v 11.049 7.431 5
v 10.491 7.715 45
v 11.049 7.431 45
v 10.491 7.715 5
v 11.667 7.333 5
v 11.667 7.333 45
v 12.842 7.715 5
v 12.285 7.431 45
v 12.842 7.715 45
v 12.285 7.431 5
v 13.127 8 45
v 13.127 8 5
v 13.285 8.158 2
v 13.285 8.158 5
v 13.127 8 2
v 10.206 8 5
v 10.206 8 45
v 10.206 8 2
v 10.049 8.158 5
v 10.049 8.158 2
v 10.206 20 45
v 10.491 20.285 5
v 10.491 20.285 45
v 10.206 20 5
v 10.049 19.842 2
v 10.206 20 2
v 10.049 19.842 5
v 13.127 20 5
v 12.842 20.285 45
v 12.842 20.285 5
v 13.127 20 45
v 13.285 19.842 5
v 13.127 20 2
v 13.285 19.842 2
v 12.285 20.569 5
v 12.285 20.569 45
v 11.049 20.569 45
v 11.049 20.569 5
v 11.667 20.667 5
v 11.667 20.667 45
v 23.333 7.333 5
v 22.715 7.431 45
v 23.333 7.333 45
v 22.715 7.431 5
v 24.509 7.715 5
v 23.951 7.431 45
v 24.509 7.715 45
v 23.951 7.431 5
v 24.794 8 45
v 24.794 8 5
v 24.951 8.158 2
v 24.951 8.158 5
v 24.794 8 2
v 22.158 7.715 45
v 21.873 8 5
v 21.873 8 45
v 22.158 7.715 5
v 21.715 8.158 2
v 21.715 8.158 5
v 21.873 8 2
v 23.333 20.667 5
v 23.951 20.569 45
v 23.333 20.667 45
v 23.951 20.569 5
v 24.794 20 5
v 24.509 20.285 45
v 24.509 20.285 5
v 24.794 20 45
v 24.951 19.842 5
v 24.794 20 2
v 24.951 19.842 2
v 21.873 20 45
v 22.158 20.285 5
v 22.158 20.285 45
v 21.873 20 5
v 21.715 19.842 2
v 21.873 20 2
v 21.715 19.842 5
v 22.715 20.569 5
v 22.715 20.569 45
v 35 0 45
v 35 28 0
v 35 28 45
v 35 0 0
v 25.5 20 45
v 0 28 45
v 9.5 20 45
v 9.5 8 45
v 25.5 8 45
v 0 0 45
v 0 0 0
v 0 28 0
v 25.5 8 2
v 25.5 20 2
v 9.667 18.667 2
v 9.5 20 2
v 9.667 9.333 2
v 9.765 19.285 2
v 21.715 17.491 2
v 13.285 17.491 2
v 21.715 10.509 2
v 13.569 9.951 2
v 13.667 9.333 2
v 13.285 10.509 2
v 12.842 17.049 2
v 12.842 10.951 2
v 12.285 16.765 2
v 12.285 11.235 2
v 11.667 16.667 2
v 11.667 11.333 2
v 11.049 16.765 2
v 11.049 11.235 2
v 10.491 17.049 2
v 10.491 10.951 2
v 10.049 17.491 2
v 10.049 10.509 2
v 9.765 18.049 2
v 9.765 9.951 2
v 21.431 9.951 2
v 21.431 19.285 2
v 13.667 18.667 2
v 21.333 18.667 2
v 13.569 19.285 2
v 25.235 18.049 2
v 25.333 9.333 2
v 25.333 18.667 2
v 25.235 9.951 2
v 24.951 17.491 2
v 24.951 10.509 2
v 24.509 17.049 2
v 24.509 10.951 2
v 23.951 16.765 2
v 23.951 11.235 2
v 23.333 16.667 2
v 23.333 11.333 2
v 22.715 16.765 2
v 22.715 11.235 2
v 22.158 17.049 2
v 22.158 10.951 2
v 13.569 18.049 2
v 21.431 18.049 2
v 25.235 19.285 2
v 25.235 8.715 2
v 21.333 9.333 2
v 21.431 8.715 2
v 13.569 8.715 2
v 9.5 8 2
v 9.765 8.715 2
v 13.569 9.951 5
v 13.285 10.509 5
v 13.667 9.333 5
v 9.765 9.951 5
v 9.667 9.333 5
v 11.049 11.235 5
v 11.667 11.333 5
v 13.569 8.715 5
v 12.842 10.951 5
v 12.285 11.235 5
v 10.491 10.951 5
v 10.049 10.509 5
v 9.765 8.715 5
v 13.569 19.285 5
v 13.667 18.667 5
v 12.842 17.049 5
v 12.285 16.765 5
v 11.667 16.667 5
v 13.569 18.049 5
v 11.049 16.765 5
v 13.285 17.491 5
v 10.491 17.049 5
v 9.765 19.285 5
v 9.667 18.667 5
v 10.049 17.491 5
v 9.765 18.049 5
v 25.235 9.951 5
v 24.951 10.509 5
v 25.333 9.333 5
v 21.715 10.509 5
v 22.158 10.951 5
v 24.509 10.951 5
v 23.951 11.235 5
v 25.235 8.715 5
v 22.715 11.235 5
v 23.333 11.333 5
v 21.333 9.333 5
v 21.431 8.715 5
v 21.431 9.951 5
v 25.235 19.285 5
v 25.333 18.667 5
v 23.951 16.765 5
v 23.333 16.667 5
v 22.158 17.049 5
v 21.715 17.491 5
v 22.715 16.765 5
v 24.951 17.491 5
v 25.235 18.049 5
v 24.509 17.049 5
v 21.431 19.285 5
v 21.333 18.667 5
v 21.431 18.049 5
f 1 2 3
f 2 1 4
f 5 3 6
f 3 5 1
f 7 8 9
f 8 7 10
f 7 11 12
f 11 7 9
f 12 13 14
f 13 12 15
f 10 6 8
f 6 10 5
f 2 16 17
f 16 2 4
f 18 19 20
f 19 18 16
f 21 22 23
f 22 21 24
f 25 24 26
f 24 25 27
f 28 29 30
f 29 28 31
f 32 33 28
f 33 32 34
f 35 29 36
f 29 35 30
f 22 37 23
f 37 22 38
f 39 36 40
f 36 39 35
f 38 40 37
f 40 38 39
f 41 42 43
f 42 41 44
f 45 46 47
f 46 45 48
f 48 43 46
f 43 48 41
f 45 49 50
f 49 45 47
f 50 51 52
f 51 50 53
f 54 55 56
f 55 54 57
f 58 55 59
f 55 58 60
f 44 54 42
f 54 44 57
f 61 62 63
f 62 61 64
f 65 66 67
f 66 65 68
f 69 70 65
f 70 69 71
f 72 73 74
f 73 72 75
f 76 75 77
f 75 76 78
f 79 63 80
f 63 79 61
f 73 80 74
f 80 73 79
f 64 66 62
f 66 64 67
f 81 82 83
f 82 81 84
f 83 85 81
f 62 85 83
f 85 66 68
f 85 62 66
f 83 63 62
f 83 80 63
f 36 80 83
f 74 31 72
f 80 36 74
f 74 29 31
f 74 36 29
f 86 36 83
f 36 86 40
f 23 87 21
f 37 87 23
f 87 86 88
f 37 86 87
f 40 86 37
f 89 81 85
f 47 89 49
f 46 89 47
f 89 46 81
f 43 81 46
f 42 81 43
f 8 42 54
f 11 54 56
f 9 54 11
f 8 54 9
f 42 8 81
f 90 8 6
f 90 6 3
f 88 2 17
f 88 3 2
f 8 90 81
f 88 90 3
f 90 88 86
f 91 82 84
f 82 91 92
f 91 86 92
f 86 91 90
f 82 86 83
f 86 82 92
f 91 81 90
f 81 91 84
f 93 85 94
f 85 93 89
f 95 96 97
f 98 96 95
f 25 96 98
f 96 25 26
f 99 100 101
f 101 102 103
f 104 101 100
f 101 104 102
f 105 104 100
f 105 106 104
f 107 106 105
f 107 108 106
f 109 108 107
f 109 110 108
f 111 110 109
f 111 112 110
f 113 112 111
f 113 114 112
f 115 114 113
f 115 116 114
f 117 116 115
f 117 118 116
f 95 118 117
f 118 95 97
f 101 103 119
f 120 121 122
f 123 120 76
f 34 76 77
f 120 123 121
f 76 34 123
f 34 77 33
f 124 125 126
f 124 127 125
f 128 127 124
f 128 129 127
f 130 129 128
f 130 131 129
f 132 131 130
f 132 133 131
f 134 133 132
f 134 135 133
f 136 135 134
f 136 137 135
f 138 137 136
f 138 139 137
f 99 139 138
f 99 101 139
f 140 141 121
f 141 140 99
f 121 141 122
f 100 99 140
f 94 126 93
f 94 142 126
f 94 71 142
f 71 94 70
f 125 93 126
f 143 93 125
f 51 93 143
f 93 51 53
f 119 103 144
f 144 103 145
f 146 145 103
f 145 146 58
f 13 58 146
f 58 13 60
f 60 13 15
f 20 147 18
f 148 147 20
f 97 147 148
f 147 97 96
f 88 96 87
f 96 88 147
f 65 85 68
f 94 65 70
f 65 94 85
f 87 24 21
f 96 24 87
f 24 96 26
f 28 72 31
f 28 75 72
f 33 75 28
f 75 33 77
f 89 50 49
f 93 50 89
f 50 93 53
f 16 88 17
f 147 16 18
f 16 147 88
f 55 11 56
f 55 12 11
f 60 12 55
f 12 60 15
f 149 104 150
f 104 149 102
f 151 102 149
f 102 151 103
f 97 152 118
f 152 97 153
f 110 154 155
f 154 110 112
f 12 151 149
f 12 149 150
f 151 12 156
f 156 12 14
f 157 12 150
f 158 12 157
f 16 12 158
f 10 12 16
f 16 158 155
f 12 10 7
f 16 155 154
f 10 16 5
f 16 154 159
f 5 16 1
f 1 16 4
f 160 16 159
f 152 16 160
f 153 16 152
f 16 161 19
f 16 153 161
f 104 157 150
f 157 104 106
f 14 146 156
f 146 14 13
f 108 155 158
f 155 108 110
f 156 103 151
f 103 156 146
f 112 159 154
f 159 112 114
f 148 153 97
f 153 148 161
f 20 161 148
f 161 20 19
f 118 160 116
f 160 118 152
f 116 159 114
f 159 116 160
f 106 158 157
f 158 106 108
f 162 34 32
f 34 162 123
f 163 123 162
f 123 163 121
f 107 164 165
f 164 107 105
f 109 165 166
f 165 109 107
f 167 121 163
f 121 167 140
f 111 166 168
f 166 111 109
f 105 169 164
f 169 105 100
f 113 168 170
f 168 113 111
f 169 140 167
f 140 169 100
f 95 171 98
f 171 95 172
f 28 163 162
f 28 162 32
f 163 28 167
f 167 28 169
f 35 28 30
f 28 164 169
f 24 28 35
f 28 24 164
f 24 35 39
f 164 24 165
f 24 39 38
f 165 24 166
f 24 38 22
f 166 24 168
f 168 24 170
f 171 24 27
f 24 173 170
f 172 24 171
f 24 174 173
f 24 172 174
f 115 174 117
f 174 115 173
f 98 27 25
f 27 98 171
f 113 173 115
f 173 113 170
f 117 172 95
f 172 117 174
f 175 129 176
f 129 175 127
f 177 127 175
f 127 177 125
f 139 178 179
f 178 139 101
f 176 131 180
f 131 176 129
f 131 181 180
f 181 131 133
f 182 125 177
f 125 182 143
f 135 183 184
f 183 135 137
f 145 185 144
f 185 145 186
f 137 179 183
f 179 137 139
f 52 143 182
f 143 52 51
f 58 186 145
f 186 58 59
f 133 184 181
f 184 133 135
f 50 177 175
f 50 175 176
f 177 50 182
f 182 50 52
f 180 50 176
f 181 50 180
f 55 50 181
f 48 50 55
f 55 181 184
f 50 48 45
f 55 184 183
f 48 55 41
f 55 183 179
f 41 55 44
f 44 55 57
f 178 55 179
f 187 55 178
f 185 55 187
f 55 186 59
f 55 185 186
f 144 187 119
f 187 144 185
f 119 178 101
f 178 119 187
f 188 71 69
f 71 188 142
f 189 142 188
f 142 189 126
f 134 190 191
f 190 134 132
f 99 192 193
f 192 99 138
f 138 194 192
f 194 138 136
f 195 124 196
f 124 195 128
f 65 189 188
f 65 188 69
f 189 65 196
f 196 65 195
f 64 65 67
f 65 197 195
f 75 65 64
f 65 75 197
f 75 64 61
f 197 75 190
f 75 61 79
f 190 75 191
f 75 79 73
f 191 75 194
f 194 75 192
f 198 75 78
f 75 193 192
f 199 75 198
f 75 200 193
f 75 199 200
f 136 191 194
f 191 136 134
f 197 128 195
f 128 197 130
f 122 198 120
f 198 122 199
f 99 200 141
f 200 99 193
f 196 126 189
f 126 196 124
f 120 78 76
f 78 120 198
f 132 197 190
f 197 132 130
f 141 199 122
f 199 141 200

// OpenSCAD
/* 
 * Ratchet Holder Generator
 * Holds ratchets in various drive sizes
 * Compatible with toolgrid-generator.scad peg hole pattern
 */

/* [Display Mode] */
print_mode = "single"; // [single, multi_row]

/* [Grid Integration] */
hole_center_spacing = 9.5; // [8:12]
pin_hole_diameter = 4.2; // [3:8]

/* [Drive Size] */
drive_size = "1-4"; // [1-4, 3-8]

/* [Housing Dimensions] */
housing_width = 35; // [25:50]
housing_height = 28; // [18:40]
housing_depth = 45; // [30:70]

/* [Pin Configuration] */
pin_diameter = 4.0; // [3:6]
num_pins_x = 2; // [1:4]
num_pins_y = 2; // [1:4]

/* [Rotation] */
holder_rotation = 0; // [0:360]

/* [Wall Thickness] */
wall_thickness = 3; // [2:5]
floor_thickness = 2; // [1:4]

/* [Advanced] */
pin_offset_from_edge = 3; // [1:8]
fillet_radius = 1; // [0:3]

// ===== CALCULATED PARAMETERS =====
pin_spacing_x = housing_width / (num_pins_x + 1);
pin_spacing_y = housing_height / (num_pins_y + 1);

// ===== MAIN MODULES =====

module holder_base() {
    difference() {
        cube([housing_width, housing_height, housing_depth]);
        
        // Central cavity for ratchet head
        translate([
            (housing_width - 16) / 2,
            (housing_height - 12) / 2,
            floor_thickness
        ]) {
            cube([16, 12, housing_depth]);
        }
        
        for (x = [1:num_pins_x]) {
            for (y = [1:num_pins_y]) {
                pin_x = x * pin_spacing_x;
                pin_y = y * pin_spacing_y;
                translate([pin_x, pin_y, pin_offset_from_edge]) {
                    cylinder(d=pin_diameter, h=housing_depth, $fn=20);
                }
            }
        }
    }
    
    for (x = [1:num_pins_x]) {
        for (y = [1:num_pins_y]) {
            pin_x = x * pin_spacing_x;
            pin_y = y * pin_spacing_y;
            translate([pin_x, pin_y, 0]) {
                cylinder(d=pin_diameter, h=pin_offset_from_edge + pin_diameter/2, $fn=20);
            }
        }
    }
}

module mounting_pegs() {
    peg_diameter = pin_hole_diameter - 0.2;
    peg_height = 5;
    
    translate([pin_diameter/2 + wall_thickness, housing_height/2, 0]) {
        cylinder(d=peg_diameter, h=peg_height, $fn=20);
    }
    translate([housing_width - wall_thickness - pin_diameter/2, housing_height/2, 0]) {
        cylinder(d=peg_diameter, h=peg_height, $fn=20);
    }
}

module complete_holder() {
    translate([housing_width/2, housing_height/2, 0]) {
        rotate([0, 0, holder_rotation]) {
            translate([-housing_width/2, -housing_height/2, 0]) {
                holder_base();
            }
        }
    }
    mounting_pegs();
}

// ===== GENERATION =====

if (print_mode == "single") {
    complete_holder();
} else if (print_mode == "multi_row") {
    spacing = hole_center_spacing * 2.5;
    for (i = [0:3]) {
        translate([i * spacing, 0, 0]) {
            complete_holder();
        }
    }
}

// ===== DEBUG OUTPUT =====
echo("=== Ratchet Holder Generator ===");
echo("Drive size: ", drive_size);
echo("Housing: ", housing_width, "×", housing_height, "×", housing_depth, "mm");
echo("Support pins: ", num_pins_x, "×", num_pins_y);
echo("Rotation: ", holder_rotation, "°");
